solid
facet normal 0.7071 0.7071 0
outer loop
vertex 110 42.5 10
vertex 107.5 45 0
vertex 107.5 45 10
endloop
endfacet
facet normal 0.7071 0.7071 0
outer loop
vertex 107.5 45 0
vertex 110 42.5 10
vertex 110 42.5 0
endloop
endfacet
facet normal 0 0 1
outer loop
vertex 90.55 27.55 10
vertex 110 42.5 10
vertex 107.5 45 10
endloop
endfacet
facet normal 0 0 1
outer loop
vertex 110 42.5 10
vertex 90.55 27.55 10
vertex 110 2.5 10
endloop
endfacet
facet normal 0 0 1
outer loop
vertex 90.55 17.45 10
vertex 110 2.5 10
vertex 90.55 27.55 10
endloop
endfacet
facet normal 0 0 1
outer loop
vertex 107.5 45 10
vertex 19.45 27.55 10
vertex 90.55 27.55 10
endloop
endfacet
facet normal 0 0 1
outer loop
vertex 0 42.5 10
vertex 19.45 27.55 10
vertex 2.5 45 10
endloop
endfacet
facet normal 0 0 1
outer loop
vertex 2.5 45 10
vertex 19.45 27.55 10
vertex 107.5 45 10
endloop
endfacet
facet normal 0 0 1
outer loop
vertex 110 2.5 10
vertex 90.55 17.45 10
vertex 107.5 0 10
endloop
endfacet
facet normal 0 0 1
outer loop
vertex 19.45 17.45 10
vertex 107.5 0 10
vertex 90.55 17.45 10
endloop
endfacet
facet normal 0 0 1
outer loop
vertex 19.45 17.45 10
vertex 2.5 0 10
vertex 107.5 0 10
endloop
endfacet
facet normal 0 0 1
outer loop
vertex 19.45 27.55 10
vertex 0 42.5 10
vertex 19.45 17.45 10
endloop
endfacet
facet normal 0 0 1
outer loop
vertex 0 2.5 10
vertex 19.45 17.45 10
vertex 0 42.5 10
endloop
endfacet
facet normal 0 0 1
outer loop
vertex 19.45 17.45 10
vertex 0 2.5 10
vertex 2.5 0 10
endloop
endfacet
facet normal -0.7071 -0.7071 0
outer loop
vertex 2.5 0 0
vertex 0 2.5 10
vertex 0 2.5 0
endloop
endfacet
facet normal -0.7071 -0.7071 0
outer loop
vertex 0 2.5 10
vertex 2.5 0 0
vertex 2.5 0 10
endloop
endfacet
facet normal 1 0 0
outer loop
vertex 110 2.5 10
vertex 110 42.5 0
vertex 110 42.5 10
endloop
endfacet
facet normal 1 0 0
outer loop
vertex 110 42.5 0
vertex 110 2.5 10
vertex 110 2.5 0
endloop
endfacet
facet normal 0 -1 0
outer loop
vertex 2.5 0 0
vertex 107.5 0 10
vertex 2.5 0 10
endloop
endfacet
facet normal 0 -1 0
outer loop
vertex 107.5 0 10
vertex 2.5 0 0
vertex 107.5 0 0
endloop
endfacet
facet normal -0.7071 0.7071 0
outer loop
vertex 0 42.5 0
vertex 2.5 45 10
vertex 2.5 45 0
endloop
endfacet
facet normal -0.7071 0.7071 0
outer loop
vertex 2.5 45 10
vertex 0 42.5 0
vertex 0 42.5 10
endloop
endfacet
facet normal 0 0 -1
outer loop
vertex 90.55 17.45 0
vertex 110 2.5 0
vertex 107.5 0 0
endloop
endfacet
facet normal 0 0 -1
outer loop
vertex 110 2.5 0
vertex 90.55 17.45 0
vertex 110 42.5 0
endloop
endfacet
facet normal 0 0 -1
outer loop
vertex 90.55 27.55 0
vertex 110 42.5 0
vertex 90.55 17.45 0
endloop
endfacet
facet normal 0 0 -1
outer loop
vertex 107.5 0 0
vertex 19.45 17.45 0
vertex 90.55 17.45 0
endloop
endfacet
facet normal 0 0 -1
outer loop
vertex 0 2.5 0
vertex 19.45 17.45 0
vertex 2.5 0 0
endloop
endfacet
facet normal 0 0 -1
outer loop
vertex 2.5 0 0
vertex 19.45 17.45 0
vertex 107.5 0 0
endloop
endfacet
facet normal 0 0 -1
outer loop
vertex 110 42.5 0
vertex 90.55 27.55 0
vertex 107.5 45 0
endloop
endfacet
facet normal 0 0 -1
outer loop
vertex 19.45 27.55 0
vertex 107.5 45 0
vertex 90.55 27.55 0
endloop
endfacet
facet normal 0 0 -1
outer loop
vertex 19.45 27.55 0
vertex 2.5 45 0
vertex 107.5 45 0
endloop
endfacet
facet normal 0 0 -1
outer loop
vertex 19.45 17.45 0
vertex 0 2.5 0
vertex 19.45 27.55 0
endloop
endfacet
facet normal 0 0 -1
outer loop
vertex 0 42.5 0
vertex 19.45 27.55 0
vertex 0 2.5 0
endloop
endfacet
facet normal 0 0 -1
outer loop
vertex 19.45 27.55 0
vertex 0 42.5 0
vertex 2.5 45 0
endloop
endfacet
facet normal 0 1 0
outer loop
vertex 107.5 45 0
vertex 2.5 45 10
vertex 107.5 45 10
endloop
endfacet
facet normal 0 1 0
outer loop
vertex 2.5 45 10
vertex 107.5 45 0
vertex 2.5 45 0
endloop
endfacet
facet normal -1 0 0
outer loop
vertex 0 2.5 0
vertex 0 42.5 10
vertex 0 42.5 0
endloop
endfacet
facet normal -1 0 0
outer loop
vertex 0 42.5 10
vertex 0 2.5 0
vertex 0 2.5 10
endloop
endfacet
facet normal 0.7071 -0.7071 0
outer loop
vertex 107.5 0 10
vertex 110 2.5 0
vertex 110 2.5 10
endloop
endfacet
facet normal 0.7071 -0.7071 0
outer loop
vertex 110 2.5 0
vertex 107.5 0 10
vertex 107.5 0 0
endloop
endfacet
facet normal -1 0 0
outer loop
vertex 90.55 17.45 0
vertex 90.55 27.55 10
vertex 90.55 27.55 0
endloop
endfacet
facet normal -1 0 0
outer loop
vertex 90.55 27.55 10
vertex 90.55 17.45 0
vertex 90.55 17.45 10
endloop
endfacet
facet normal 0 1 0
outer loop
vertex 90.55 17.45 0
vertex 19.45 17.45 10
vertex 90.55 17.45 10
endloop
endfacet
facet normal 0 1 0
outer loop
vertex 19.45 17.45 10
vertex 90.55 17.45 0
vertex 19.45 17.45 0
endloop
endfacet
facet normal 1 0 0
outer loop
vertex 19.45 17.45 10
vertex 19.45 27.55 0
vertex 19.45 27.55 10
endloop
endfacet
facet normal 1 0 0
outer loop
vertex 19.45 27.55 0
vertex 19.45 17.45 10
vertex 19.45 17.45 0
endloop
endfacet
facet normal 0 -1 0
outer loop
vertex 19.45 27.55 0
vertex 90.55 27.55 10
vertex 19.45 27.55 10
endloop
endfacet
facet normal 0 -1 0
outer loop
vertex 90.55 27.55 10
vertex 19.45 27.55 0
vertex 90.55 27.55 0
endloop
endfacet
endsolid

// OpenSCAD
$fn = 32;

// ----------------------------------------------------------------------
// Windowed plate: 1 voids, 110 x 45 x 10 mm
// ----------------------------------------------------------------------

// --- parameters (mm) ---
plate_l = 110;            // plate length, X
plate_w = 45;             // plate width, Y
plate_t = 10;             // plate thickness, Z
edge_margin = 12;         // wall from the plate edge to any window
win1_l = 71.1;            // window length
win1_w = 10.1;            // window width
depth_1 = 10;             // depth of void 1 (full thickness = through)
corner_c = 2.5;           // corner chamfer of the plate

profile = [[2.5, 0], [107.5, 0], [110, 2.5], [110, 42.5], [107.5, 45], [2.5, 45], [0, 42.5], [0, 2.5]];  // primary outline, 8 points, counter clockwise
void_1 = [[19.45, 17.45], [90.55, 17.45], [90.55, 27.55], [19.45, 27.55]];  // large central window, 4 points

// --- the one profile operation ---
difference() {
  linear_extrude(height = plate_t) polygon(points = profile);
  translate([0, 0, -1])
    linear_extrude(height = plate_t + 2) polygon(points = void_1);
}
